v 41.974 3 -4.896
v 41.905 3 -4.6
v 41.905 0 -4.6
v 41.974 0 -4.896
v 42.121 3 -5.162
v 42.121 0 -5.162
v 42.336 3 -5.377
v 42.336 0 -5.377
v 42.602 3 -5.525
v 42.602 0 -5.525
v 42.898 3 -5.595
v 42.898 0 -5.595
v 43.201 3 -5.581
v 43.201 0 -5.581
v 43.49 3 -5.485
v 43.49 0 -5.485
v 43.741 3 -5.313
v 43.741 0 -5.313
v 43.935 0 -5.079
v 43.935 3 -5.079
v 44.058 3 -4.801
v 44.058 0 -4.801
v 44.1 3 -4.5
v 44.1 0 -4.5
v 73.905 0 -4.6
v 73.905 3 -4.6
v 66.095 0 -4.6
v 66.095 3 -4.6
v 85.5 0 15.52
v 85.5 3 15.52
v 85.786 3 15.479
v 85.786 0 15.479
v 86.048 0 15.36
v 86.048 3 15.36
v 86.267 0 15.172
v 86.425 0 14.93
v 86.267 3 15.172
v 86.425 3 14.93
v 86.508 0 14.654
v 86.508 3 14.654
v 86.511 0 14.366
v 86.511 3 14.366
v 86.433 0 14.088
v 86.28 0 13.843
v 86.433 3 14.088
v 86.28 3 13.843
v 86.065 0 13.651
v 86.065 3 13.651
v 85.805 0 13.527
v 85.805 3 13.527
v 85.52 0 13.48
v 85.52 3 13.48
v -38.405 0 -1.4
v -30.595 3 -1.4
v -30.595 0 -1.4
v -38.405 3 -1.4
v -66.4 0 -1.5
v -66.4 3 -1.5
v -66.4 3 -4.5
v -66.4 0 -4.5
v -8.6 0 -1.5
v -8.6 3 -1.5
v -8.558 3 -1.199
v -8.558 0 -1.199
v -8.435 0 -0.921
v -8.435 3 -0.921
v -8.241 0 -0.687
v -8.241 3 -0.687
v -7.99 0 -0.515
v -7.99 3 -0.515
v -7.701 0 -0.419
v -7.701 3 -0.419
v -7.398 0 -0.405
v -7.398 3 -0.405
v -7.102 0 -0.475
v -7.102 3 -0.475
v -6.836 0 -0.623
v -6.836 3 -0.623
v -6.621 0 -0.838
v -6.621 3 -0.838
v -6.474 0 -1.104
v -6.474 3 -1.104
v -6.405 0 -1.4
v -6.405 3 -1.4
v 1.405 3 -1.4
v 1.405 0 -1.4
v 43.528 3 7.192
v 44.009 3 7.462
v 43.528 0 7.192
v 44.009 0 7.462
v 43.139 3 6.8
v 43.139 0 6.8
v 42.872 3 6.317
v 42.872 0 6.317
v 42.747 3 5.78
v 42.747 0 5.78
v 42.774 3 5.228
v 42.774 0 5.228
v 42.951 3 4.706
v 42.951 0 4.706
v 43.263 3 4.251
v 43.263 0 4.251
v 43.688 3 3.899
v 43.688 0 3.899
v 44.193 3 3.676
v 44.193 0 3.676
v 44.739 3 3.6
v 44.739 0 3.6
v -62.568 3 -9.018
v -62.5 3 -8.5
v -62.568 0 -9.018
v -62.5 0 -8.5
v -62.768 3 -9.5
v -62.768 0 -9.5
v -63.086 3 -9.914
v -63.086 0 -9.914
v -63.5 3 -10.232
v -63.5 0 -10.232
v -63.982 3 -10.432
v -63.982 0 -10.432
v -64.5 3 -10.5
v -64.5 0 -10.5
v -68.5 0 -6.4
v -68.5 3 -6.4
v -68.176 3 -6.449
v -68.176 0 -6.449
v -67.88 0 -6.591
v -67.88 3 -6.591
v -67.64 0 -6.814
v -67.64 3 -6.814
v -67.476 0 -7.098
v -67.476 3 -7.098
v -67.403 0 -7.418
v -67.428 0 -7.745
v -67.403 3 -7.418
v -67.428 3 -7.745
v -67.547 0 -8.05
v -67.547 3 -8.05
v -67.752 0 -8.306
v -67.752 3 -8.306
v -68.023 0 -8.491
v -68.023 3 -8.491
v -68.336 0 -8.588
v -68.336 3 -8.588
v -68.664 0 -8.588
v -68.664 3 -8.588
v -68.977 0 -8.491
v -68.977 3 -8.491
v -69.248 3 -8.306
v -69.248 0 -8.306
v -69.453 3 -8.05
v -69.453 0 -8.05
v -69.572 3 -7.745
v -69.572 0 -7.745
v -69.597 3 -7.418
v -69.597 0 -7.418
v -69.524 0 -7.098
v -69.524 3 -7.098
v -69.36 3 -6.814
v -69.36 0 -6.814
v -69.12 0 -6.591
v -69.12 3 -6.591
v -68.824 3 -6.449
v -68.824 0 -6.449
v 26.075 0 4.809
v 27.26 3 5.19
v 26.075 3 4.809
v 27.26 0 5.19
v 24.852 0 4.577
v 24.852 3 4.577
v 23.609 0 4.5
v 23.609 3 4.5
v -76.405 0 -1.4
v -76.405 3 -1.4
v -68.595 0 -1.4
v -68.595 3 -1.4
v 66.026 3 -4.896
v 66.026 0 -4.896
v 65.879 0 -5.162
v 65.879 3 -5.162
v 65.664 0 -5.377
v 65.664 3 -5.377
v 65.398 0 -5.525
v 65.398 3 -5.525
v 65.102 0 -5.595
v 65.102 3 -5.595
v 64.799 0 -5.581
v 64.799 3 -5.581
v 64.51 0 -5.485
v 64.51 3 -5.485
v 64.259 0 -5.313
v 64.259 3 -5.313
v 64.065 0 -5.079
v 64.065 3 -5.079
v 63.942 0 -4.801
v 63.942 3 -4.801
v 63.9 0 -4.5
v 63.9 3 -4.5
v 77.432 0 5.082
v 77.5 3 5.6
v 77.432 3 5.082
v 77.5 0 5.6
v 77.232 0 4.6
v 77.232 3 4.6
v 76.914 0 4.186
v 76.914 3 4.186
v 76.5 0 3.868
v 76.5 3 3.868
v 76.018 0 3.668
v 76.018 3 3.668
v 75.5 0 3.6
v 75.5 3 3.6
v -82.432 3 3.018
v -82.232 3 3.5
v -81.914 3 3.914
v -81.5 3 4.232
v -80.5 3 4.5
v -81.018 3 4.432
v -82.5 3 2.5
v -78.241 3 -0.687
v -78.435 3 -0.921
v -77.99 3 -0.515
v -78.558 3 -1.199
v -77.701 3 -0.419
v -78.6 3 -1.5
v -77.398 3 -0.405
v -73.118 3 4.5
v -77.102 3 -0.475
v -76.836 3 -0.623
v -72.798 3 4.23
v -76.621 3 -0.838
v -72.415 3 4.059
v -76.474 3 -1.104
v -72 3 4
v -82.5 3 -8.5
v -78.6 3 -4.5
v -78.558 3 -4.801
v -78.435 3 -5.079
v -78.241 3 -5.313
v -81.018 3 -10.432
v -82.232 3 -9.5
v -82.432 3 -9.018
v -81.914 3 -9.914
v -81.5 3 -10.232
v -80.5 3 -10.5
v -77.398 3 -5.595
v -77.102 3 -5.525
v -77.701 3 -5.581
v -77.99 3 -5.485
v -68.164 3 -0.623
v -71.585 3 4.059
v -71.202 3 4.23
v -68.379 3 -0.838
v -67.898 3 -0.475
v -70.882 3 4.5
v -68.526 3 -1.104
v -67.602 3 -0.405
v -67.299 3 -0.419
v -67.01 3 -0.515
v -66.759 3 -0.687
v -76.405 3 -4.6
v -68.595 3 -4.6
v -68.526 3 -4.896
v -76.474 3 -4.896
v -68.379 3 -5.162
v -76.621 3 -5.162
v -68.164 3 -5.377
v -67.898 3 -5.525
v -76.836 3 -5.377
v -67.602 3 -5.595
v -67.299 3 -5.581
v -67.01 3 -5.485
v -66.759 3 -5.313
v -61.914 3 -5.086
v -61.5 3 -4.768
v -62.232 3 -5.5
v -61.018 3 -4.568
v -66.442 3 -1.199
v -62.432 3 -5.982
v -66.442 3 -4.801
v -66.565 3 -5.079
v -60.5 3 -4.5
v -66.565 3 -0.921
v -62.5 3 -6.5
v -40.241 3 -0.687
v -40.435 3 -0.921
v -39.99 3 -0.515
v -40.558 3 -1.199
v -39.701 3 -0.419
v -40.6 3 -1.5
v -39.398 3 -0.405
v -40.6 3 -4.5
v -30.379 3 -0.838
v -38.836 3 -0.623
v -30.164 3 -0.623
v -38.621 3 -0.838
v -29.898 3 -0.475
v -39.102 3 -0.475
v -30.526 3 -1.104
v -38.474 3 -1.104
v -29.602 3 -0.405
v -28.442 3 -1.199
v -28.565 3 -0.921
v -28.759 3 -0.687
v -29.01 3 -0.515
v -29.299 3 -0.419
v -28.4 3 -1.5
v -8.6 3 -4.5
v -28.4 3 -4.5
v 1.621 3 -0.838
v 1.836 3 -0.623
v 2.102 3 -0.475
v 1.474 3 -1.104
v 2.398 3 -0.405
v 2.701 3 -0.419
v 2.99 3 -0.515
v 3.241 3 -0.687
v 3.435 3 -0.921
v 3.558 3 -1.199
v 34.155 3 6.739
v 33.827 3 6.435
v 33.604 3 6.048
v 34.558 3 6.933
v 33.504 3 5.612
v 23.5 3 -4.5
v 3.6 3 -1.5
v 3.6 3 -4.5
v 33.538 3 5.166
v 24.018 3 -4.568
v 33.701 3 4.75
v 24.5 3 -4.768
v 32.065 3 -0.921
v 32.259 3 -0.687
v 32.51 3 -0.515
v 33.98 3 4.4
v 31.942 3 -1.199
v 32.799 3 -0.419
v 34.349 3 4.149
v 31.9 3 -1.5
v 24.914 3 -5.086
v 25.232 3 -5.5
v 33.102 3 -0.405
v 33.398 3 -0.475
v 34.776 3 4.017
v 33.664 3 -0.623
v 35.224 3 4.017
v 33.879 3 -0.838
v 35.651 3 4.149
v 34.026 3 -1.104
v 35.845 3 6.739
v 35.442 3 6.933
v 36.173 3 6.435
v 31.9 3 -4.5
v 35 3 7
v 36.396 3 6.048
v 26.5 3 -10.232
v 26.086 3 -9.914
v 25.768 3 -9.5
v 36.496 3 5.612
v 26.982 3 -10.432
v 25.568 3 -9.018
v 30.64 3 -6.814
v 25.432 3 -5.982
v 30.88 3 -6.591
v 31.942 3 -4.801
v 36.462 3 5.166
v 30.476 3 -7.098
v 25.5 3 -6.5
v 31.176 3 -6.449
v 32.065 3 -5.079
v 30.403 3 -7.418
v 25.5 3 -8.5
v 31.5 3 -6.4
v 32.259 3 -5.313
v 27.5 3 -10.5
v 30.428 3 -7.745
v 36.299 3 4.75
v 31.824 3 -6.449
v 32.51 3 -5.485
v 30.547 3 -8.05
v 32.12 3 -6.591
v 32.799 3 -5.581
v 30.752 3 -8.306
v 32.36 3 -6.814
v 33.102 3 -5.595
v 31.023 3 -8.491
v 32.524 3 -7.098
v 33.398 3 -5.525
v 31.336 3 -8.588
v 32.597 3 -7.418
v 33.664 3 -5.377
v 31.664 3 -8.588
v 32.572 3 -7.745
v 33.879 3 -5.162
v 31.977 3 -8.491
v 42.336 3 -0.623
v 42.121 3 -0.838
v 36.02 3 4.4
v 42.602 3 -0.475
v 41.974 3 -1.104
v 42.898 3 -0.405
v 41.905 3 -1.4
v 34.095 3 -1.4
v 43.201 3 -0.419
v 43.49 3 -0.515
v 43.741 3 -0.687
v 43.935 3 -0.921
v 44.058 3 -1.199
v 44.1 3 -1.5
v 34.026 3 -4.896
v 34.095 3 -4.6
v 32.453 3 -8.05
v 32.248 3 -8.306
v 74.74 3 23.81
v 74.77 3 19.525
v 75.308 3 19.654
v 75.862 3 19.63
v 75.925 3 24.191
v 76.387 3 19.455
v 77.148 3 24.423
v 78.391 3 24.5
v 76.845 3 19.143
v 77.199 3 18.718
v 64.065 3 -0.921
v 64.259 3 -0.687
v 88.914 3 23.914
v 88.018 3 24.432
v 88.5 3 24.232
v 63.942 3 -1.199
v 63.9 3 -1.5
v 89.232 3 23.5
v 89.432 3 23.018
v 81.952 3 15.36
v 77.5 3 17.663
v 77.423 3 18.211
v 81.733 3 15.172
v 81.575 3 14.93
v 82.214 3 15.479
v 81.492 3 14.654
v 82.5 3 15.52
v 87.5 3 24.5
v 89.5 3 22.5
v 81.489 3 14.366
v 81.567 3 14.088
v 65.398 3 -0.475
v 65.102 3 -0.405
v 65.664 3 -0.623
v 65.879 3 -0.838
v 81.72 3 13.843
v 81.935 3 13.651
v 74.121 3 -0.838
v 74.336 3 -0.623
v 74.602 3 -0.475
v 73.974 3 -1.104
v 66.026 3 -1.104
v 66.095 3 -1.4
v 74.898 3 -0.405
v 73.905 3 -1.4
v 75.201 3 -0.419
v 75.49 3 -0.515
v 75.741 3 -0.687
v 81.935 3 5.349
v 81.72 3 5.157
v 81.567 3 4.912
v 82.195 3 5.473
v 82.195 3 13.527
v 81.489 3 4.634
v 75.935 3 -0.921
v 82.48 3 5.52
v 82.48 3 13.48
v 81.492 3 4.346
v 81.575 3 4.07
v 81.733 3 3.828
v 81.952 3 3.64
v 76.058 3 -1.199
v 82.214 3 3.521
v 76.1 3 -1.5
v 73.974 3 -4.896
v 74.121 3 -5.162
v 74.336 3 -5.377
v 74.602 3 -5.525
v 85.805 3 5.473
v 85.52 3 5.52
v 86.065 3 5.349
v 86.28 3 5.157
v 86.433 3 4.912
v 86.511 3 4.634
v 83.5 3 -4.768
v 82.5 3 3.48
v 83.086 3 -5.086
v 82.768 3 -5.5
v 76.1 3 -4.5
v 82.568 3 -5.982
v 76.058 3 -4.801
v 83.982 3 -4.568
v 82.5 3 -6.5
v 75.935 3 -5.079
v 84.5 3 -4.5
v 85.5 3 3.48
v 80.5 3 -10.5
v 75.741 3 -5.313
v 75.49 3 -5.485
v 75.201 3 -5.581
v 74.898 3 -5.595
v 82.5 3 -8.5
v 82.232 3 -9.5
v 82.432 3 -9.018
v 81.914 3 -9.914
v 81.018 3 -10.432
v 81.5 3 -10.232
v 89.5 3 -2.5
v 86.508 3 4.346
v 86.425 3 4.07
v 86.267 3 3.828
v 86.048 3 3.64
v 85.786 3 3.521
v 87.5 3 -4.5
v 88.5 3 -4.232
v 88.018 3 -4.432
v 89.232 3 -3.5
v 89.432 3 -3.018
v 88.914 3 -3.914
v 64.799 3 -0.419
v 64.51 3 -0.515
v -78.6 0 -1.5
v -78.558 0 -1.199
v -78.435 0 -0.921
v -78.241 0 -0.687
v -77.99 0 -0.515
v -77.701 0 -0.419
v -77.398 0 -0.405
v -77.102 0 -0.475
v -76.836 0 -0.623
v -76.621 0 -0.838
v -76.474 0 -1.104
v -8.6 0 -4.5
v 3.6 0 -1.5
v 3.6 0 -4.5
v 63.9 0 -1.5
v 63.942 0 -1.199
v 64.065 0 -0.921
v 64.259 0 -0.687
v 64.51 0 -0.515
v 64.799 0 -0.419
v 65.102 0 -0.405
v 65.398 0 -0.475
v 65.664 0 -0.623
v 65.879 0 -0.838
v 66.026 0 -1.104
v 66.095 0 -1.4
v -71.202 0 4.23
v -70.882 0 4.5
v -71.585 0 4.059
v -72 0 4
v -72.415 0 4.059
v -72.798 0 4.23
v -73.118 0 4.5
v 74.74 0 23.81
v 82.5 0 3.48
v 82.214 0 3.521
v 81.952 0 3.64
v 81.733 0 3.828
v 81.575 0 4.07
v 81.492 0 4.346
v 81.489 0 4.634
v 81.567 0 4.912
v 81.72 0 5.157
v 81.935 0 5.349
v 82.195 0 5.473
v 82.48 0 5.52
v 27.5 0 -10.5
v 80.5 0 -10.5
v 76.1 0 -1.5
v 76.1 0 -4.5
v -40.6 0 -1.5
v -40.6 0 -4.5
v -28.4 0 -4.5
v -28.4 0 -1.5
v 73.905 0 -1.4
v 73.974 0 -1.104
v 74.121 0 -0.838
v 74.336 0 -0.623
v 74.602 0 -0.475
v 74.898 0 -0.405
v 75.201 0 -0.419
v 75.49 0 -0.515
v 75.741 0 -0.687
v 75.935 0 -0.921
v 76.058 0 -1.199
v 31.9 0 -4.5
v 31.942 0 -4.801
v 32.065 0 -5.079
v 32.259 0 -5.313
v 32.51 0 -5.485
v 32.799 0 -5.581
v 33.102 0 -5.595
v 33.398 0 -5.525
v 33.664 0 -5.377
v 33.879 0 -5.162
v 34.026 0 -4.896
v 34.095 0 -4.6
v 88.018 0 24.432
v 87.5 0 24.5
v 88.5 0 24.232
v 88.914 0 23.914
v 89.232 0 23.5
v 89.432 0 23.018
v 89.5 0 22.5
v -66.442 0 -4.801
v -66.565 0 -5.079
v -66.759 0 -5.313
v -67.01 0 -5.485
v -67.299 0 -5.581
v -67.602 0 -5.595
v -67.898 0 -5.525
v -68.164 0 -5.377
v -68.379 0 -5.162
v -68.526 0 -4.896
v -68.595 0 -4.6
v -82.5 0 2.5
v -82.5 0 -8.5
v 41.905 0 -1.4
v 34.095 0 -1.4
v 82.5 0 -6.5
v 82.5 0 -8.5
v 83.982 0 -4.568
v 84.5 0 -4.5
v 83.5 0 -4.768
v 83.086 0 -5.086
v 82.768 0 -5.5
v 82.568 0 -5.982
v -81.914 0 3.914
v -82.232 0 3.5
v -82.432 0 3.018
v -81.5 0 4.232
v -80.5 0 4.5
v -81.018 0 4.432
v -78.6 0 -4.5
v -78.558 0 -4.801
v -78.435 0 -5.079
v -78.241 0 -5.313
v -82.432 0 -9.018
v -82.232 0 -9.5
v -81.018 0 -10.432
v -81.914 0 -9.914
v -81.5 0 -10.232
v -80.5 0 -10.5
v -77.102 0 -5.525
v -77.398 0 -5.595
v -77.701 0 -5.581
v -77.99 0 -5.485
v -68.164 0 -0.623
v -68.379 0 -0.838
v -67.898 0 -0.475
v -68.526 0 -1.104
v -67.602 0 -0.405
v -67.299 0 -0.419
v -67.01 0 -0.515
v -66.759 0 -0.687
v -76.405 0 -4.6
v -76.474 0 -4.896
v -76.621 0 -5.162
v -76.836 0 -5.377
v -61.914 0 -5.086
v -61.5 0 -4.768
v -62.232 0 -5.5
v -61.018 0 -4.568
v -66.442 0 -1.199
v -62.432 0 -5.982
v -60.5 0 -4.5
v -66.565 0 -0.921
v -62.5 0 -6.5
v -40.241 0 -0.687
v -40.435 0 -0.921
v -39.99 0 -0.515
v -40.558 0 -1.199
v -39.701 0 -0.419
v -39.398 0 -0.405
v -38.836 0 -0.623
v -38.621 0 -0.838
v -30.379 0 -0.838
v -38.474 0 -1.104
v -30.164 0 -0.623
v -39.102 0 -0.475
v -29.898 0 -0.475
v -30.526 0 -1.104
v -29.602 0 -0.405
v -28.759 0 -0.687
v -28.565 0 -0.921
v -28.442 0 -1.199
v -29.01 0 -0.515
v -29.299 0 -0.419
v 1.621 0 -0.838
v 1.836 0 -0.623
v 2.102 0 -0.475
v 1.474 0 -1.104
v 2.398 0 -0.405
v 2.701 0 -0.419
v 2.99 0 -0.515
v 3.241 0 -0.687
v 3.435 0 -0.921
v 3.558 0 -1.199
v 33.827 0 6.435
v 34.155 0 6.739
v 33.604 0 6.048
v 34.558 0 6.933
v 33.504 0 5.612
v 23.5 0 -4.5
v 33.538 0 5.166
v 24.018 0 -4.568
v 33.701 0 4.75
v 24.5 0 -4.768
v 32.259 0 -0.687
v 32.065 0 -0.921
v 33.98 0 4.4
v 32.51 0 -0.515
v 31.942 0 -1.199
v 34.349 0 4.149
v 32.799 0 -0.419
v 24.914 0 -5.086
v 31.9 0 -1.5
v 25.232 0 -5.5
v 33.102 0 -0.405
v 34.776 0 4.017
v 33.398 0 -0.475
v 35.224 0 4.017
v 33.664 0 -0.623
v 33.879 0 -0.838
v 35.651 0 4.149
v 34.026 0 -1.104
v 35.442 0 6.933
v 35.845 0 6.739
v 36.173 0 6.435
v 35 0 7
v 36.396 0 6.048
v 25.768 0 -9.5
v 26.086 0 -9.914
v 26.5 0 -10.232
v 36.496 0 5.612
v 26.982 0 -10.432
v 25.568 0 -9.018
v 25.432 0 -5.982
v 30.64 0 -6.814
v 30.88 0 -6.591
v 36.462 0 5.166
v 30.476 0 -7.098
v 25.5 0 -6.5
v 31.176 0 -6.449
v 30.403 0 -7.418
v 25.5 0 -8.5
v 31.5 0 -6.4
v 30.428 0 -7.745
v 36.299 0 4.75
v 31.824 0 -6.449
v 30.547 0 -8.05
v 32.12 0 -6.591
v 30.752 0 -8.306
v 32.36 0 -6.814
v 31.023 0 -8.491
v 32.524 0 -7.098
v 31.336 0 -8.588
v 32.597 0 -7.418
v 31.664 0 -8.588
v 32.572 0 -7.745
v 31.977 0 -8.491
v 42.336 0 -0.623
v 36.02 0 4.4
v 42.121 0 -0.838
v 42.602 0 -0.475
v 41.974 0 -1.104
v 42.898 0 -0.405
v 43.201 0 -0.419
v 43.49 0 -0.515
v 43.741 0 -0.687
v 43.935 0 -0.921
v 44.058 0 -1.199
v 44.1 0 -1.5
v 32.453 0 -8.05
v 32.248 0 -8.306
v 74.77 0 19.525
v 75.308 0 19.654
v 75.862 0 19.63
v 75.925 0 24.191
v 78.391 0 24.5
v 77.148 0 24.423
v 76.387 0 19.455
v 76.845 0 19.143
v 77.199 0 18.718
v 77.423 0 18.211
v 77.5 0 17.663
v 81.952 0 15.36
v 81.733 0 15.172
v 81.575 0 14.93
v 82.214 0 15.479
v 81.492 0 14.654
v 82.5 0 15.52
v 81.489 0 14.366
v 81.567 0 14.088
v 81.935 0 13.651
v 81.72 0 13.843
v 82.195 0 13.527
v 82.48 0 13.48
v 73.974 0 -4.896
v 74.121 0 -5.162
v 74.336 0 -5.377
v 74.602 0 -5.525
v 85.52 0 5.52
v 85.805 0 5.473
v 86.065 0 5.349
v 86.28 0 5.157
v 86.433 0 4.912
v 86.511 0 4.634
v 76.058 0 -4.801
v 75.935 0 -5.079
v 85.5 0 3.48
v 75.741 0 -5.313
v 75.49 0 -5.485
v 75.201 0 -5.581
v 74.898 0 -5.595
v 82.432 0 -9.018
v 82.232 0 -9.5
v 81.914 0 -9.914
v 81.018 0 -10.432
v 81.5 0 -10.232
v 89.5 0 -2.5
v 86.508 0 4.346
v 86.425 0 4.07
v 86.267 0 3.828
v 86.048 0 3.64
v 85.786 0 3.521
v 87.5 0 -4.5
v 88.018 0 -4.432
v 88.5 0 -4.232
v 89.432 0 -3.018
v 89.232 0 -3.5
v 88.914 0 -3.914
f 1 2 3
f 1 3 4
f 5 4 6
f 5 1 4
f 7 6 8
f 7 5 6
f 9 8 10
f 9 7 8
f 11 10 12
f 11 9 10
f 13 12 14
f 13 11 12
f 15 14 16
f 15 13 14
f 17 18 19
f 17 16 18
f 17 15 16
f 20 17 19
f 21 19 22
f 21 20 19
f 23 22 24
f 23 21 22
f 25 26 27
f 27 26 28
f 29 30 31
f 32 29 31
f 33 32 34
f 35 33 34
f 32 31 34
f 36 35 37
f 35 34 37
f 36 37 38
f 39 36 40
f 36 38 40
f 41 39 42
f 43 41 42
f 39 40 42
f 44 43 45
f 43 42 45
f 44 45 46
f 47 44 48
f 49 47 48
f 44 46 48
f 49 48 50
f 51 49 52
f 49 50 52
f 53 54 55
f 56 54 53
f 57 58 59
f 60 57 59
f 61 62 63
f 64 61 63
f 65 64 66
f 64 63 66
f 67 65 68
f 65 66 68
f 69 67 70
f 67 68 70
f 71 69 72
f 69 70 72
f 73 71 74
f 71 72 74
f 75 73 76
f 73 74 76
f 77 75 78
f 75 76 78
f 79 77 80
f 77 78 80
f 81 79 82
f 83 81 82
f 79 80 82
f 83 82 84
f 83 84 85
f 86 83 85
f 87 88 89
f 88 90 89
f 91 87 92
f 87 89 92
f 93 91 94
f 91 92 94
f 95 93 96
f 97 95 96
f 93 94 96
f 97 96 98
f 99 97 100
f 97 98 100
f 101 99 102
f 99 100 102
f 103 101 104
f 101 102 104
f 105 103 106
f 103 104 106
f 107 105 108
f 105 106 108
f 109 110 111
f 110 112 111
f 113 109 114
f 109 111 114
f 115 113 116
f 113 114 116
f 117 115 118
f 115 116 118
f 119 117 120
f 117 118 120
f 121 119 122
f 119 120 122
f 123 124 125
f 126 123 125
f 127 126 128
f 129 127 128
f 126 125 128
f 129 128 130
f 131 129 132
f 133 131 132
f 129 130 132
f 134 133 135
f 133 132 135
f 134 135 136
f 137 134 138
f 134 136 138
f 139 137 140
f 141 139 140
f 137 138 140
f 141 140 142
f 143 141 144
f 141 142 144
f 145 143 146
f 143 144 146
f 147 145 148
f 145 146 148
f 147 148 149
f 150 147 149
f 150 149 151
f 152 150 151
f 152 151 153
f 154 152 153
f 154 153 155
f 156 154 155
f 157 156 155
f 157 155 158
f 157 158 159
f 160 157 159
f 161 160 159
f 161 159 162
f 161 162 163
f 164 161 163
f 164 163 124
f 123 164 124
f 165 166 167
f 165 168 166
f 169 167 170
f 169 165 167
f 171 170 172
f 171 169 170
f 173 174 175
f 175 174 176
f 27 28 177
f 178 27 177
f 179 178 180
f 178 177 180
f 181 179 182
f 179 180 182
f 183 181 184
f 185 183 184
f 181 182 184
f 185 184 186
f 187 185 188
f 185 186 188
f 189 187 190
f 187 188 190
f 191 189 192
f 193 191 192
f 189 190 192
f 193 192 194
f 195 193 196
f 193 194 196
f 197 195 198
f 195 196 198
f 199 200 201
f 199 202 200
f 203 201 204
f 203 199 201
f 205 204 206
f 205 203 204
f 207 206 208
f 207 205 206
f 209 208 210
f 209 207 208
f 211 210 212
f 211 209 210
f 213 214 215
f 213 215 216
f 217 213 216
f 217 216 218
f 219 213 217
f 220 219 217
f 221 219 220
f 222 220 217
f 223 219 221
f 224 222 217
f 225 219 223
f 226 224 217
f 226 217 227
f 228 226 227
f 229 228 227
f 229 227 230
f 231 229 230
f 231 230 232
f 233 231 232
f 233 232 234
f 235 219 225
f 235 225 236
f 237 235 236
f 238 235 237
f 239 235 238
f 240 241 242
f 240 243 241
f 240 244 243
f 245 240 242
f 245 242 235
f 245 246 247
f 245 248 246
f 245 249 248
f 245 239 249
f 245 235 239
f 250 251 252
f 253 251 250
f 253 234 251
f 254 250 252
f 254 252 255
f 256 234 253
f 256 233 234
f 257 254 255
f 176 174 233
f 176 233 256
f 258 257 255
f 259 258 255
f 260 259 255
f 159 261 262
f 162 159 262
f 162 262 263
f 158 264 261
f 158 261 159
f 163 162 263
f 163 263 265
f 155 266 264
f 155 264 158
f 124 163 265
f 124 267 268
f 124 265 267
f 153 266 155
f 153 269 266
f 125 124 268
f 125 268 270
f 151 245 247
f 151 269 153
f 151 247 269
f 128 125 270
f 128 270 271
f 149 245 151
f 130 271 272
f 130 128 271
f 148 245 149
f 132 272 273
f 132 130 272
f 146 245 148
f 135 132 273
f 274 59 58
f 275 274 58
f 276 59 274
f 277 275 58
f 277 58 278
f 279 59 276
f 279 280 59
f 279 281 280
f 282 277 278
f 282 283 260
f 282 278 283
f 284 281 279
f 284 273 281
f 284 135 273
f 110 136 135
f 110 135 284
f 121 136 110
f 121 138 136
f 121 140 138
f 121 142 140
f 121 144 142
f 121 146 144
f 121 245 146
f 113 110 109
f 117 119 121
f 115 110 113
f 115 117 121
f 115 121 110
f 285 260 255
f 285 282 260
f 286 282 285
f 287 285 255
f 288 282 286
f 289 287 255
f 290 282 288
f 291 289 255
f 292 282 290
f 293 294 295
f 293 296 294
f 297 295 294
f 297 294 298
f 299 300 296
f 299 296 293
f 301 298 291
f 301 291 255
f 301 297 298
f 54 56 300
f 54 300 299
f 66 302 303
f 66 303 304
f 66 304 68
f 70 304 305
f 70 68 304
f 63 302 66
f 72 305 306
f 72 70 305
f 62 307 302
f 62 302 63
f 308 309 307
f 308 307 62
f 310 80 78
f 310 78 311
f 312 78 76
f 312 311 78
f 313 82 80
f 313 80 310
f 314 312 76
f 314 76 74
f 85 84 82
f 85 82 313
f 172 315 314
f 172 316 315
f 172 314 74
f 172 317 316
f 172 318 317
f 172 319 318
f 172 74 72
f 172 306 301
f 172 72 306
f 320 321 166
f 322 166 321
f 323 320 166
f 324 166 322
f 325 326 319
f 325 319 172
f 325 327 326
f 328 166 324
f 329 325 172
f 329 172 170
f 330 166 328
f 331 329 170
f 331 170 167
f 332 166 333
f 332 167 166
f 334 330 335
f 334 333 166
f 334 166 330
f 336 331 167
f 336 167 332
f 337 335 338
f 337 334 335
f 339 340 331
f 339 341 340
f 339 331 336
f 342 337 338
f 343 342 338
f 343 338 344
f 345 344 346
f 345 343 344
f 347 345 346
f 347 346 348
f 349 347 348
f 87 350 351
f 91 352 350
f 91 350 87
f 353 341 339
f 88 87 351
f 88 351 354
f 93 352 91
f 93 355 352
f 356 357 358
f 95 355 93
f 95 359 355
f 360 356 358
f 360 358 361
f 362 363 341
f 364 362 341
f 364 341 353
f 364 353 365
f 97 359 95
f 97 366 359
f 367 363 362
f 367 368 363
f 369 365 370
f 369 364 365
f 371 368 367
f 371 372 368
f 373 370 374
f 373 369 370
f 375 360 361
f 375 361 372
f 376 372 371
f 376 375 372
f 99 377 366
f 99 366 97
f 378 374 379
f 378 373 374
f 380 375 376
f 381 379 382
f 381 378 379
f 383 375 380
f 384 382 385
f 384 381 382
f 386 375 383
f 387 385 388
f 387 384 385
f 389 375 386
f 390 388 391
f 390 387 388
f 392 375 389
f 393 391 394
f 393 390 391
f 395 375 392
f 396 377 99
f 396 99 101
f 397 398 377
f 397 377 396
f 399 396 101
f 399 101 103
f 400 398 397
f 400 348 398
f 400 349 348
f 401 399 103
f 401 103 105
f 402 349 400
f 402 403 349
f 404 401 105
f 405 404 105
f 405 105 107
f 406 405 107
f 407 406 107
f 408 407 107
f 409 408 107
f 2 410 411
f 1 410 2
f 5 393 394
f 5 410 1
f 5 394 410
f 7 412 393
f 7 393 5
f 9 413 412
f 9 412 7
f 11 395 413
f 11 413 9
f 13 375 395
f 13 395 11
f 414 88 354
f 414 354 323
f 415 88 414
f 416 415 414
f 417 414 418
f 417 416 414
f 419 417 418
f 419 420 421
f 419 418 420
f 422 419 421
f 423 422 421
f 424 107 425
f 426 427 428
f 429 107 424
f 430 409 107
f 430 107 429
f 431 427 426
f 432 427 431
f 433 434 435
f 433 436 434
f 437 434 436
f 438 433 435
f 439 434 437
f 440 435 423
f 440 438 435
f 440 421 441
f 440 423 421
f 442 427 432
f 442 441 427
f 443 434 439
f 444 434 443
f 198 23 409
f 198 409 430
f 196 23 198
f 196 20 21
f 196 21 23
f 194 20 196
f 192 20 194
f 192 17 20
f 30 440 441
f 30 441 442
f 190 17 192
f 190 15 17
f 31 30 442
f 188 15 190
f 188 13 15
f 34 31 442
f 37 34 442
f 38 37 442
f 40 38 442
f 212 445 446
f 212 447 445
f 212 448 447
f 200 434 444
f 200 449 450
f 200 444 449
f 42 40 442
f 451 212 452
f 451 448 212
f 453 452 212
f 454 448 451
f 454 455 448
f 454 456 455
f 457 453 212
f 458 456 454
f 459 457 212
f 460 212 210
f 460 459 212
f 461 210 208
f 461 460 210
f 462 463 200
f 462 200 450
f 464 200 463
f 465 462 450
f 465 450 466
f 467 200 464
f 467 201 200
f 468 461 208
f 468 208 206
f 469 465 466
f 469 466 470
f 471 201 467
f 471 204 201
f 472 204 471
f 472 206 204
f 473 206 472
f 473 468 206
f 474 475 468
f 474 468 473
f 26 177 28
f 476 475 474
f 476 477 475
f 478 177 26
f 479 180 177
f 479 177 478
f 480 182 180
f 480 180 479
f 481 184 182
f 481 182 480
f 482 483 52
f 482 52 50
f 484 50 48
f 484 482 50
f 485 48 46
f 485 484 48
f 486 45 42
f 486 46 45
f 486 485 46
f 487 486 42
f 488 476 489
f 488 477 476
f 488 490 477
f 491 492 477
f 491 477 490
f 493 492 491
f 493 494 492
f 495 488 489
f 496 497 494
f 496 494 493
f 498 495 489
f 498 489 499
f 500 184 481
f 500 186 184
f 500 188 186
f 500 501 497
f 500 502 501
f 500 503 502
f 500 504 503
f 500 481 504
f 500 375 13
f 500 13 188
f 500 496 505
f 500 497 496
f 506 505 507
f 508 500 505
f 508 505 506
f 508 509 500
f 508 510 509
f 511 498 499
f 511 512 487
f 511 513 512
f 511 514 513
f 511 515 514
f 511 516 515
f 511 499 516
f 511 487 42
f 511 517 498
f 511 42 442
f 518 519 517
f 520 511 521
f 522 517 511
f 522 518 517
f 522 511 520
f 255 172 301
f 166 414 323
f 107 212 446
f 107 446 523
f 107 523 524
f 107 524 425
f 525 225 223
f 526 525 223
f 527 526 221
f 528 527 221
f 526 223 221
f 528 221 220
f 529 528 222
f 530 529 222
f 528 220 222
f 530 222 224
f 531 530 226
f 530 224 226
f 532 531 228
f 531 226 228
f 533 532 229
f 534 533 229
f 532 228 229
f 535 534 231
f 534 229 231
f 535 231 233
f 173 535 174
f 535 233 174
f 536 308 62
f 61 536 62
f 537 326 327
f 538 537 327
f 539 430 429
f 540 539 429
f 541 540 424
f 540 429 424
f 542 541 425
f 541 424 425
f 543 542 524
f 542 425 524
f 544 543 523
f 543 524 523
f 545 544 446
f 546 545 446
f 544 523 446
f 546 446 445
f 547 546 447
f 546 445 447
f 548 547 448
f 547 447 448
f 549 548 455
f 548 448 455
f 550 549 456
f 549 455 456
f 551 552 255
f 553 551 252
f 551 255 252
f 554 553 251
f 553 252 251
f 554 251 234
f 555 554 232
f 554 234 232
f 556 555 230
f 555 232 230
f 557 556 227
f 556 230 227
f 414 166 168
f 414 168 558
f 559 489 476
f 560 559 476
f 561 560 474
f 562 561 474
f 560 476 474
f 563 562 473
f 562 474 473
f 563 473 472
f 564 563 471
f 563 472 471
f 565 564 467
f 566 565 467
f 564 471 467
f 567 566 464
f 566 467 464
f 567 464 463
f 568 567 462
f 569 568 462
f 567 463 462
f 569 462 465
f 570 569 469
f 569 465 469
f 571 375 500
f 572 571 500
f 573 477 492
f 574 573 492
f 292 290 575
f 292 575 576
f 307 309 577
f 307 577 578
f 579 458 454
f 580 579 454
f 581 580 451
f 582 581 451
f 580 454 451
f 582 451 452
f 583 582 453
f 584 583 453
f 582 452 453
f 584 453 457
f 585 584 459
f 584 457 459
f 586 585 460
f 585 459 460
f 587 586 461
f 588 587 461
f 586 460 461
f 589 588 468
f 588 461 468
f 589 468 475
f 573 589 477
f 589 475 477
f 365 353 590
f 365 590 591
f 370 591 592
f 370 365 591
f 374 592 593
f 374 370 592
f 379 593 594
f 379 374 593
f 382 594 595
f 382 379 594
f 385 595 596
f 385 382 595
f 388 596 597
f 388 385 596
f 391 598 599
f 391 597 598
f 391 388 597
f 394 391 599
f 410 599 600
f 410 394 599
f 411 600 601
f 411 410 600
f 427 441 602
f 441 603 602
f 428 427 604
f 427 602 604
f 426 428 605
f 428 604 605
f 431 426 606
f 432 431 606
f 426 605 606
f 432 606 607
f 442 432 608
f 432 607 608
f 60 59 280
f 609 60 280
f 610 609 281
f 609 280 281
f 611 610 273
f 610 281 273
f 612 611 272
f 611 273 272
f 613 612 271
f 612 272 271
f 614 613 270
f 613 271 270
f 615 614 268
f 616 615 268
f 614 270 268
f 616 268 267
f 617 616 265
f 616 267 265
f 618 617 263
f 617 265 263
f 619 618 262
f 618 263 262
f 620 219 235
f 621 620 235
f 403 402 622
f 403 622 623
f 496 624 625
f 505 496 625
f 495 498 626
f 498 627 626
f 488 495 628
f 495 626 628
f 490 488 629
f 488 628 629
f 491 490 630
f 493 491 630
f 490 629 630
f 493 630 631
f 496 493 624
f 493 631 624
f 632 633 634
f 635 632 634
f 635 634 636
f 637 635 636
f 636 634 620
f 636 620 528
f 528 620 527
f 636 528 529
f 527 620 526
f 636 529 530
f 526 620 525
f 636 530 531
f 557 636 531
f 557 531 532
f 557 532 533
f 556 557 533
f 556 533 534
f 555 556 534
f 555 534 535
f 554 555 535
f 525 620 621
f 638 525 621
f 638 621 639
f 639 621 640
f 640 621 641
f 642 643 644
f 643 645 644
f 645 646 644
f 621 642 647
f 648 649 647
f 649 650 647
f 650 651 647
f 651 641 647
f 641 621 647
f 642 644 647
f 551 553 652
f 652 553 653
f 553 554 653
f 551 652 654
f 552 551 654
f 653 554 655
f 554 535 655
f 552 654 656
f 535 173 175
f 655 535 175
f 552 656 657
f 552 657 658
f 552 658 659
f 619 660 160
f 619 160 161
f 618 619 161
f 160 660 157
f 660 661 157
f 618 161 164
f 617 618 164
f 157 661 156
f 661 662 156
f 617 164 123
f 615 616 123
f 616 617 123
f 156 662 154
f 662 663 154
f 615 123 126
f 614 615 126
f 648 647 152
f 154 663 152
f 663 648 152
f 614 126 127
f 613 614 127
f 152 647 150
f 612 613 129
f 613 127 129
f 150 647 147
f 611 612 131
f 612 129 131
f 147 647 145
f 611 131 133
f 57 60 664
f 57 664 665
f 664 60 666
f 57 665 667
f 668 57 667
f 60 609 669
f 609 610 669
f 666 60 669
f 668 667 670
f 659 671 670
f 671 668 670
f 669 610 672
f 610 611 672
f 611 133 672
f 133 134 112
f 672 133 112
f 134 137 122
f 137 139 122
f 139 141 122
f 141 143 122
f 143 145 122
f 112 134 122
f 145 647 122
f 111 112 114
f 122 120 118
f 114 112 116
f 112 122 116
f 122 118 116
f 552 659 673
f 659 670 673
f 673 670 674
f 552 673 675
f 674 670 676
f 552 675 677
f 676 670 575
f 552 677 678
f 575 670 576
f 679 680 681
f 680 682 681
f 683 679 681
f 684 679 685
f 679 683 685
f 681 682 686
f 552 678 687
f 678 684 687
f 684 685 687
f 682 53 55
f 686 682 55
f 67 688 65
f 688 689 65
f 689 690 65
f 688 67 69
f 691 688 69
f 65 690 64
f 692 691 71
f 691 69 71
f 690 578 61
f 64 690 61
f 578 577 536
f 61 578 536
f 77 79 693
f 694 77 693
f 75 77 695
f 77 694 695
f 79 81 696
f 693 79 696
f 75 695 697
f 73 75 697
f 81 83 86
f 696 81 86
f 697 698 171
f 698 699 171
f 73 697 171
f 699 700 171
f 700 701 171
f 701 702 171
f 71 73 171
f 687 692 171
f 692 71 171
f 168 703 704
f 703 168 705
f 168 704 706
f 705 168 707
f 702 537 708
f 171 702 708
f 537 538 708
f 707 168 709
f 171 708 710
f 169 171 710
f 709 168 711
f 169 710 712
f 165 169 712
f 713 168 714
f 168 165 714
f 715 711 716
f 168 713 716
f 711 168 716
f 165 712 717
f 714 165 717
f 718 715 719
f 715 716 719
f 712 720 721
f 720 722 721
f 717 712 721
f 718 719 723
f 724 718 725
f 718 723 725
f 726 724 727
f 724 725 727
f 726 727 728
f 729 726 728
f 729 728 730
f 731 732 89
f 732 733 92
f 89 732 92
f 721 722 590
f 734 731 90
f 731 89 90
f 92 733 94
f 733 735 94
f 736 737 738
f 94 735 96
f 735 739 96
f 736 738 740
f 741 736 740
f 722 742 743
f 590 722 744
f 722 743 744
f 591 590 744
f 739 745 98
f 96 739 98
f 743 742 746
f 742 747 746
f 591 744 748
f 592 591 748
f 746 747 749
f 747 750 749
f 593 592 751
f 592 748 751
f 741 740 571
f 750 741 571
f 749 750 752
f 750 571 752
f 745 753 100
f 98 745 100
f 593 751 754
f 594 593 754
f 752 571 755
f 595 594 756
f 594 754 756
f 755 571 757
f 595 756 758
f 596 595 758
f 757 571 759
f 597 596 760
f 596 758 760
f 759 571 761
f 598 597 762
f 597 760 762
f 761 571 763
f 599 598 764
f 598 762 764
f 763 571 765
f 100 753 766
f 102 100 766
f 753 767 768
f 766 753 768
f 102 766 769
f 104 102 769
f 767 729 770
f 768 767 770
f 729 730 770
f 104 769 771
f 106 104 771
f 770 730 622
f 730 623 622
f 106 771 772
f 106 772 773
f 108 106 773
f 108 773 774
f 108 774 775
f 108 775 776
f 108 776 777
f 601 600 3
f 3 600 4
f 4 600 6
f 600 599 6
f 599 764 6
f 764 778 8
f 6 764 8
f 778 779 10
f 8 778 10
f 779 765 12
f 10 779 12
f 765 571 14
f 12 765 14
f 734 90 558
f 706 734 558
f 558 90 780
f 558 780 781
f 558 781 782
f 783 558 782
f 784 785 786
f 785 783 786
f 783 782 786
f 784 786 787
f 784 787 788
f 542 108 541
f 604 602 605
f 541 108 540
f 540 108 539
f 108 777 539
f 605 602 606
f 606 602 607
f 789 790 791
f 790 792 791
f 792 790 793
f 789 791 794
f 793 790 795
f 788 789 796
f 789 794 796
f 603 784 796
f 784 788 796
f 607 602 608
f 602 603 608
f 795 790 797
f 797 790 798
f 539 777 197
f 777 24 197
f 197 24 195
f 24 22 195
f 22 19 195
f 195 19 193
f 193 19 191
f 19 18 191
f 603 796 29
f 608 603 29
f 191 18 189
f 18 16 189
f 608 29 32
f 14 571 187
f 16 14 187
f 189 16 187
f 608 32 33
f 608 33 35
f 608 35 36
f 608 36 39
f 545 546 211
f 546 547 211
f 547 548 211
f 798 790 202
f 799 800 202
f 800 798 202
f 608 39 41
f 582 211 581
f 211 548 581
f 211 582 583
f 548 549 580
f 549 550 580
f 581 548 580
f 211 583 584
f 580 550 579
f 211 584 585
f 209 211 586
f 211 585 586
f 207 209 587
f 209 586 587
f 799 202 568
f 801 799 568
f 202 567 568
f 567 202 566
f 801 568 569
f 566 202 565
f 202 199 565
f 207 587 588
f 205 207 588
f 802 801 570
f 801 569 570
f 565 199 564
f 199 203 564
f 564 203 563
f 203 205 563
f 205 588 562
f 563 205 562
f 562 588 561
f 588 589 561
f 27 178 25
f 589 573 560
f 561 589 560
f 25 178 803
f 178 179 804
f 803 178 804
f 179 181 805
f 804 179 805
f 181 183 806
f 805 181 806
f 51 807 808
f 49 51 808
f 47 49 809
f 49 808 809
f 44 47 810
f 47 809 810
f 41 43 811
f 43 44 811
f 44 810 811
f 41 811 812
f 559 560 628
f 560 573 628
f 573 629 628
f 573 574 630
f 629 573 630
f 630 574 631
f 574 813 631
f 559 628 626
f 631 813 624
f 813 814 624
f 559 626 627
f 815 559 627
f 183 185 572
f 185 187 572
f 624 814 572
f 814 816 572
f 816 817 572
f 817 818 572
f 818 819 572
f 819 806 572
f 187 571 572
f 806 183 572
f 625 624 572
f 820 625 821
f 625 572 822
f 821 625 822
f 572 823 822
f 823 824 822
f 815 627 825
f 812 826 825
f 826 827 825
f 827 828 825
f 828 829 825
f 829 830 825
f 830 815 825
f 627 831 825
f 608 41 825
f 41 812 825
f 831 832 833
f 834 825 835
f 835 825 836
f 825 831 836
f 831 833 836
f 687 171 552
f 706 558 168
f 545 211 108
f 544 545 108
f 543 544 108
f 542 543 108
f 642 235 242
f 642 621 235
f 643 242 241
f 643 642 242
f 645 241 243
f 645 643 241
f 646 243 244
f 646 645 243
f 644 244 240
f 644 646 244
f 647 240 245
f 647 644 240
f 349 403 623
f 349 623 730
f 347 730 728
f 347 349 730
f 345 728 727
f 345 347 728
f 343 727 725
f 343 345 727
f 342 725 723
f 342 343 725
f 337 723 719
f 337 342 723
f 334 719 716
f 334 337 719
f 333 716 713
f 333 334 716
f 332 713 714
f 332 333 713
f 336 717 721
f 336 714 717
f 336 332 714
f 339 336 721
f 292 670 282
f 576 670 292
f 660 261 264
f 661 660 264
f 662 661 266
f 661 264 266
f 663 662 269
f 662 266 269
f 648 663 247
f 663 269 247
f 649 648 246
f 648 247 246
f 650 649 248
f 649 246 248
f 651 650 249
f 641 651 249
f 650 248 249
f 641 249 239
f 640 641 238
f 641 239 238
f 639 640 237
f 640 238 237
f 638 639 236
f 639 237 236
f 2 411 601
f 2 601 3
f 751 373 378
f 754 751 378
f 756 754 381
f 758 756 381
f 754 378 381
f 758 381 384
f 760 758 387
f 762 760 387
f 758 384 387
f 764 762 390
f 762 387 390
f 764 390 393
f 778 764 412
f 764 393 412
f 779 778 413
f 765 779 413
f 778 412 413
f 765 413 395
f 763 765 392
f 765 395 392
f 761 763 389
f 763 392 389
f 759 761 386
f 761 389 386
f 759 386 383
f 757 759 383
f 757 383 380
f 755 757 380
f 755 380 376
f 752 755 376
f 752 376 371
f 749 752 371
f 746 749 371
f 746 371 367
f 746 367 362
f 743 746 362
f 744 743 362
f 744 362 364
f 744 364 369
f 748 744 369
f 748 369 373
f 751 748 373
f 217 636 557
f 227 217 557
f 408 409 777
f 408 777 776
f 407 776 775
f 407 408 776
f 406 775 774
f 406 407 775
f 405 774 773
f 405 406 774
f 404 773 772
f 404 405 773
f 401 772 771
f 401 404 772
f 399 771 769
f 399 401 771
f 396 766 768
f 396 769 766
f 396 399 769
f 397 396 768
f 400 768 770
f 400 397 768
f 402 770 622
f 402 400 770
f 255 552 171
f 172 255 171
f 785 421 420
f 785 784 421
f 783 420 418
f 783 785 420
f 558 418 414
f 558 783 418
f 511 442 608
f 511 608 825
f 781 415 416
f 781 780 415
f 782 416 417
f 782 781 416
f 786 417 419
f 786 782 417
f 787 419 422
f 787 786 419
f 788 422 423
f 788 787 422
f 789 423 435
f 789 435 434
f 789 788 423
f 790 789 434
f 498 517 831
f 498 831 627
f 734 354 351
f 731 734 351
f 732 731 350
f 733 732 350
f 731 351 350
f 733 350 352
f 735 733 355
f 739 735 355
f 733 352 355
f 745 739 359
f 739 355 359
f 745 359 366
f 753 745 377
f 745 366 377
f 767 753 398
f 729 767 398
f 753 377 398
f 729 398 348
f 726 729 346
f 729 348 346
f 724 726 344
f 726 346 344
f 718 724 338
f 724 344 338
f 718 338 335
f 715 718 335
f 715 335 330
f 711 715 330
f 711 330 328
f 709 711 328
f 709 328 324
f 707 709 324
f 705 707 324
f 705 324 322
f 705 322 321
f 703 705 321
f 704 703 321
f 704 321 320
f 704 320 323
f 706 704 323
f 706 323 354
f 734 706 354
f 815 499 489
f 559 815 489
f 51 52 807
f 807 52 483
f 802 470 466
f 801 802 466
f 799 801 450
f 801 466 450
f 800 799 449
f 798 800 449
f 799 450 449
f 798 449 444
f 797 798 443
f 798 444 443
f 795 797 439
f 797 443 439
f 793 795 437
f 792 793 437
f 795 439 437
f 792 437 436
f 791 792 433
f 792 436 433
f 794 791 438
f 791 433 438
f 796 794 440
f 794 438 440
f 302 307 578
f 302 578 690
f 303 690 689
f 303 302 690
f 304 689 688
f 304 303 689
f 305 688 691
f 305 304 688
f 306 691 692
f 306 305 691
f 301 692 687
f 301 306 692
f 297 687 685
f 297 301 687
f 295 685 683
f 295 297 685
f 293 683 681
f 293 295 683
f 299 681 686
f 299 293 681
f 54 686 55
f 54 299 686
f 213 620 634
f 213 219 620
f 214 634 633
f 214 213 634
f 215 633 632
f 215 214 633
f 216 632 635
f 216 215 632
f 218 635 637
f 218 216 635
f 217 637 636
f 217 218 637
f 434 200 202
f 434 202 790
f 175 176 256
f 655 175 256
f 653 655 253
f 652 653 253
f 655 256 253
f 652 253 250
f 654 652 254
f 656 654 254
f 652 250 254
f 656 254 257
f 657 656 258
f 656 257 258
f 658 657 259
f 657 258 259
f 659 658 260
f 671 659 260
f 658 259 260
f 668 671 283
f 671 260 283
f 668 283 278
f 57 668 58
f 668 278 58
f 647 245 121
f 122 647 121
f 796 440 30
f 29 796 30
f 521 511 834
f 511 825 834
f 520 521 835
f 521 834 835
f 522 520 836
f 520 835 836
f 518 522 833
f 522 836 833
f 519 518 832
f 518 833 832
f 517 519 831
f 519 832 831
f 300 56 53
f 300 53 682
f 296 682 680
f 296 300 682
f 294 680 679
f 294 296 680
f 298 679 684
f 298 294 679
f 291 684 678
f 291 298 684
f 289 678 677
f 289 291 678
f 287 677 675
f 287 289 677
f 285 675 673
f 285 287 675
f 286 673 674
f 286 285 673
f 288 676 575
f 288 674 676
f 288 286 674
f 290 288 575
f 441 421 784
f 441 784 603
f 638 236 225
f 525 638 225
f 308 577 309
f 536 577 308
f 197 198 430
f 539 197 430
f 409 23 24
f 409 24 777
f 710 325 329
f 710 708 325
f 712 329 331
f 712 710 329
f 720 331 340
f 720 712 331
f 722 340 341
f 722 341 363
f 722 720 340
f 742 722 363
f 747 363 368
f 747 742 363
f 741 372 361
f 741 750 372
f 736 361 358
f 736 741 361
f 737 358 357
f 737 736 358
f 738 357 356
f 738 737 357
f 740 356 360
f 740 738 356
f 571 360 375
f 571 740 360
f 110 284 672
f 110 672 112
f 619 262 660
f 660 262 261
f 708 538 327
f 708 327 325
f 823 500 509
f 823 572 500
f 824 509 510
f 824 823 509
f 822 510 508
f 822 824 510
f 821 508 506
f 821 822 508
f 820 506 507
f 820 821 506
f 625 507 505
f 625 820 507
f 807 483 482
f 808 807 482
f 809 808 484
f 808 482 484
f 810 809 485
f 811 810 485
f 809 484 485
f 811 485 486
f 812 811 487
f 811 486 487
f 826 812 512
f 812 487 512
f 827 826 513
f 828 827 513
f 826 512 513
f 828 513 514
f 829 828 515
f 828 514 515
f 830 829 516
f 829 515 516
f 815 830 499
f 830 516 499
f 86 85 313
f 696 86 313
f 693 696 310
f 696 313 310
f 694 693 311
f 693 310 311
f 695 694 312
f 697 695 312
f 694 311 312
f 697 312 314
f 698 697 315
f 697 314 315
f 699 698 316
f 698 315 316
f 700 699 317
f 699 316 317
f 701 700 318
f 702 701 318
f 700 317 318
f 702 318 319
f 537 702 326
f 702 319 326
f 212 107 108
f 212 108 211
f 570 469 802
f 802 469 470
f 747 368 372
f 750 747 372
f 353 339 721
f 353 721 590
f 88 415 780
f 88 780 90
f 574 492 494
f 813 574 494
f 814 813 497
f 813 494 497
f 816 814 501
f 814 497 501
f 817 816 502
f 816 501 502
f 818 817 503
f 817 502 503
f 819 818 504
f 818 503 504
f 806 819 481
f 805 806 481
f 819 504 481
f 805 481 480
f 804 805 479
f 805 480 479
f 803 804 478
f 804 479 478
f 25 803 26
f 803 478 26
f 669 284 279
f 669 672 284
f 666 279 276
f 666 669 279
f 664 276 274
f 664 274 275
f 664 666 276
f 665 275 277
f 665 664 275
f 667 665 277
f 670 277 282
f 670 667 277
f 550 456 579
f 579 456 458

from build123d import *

# Parameters (mm, degrees)
SKETCH_1_W             = 165
SKETCH_1_H             = 9
EXTRUDE_1_DEPTH        = 3
SKETCH_2_W             = 20
SKETCH_2_H             = 6
SKETCH_2_W_2           = 57
EXTRUDE_2_DEPTH        = 3
FILLET_1_R             = 2
SKETCH_3_W             = 12
SKETCH_3_H             = 3
CUT_EXTRUDE_1_DEPTH    = 87.113297463
SKETCH_5_R             = 1
CUT_EXTRUDE_3_DEPTH    = 87.113297463
EXTRUDE_4_DEPTH        = 3
SKETCH_10_R            = 1
CUT_EXTRUDE_5_DEPTH    = 93.841262378
CUT_EXTRUDE_6415_DEPTH = 93.841262378
FILLET_2_R             = 2
FILLET_3_R             = 10
CUT_EXTRUDE_6_DEPTH    = 93.841262378
FILLET_4_R             = 2
SKETCH_12_R            = 1.1
SKETCH_12_R_2          = 1.5
CUT_EXTRUDE_7_DEPTH    = 93.841262378


with BuildPart() as part:
    # 草图1 → 凸台-拉伸1 (new body)
    with BuildSketch(Plane(origin=(0, 0, 0), x_dir=(1, 0, 0), z_dir=(0, 1, 0))):
        Rectangle(SKETCH_1_W, SKETCH_1_H)
    extrude(amount=EXTRUDE_1_DEPTH)

    # 草图2 → 凸台-拉伸2 (add)
    with BuildSketch(Plane(origin=(0, 3, 0), x_dir=(1, 0, 0), z_dir=(0, 1, 0))):
        with Locations((-72.5, 7.5)):
            Rectangle(SKETCH_2_W, SKETCH_2_H)
        Polygon((82.5, -24.5), (82.5, -4.5), (25.5, -4.5), (76.5, -24.5), align=None)
        with Locations((54, 7.5)):
            Rectangle(SKETCH_2_W_2, SKETCH_2_H)
    extrude(amount=-EXTRUDE_2_DEPTH)

    # 圆角1
    fillet_1_edges = [part.edges().sort_by_distance(p)[0] for p in [
        (-82.5, 1.5, -10.5),
        (-62.5, 1.5, -10.5),
        (-62.5, 1.5, -4.5),
        (82.5, 1.5, -10.5),
        (25.5, 1.5, -4.5),
        (25.5, 1.5, -10.5),
        (-82.5, 1.5, 4.5),
    ]]
    fillet(fillet_1_edges, radius=FILLET_1_R)

    # 草图3 → 切除-拉伸1 (cut, through all)
    with BuildSketch(Plane(origin=(0, 3, 0), x_dir=(1, 0, 0), z_dir=(0, 1, 0))):
        with Locations((-72.5, 3)):
            Rectangle(SKETCH_3_W, SKETCH_3_H)
        with Locations((-34.5, 3)):
            Rectangle(SKETCH_3_W, SKETCH_3_H)
        with Locations((-2.5, 3)):
            Rectangle(SKETCH_3_W, SKETCH_3_H)
        with Locations((38, 3)):
            Rectangle(SKETCH_3_W, SKETCH_3_H)
        with Locations((70, 3)):
            Rectangle(SKETCH_3_W, SKETCH_3_H)
    extrude(amount=-CUT_EXTRUDE_1_DEPTH, mode=Mode.SUBTRACT)

    # 草图5 → 切除-拉伸3 (cut, through all)
    with BuildSketch(Plane(origin=(0, 3, 0), x_dir=(1, 0, 0), z_dir=(0, 1, 0))):
        with Locations((-67.5, 4.5)):
            Circle(SKETCH_5_R)
        with Locations((-67.5, 1.5)):
            Circle(SKETCH_5_R)
        with Locations((-77.5, 1.5)):
            Circle(SKETCH_5_R)
        with Locations((-77.5, 4.5)):
            Circle(SKETCH_5_R)
        with Locations((-29.5, 1.5)):
            Circle(SKETCH_5_R)
        with Locations((-39.5, 1.5)):
            Circle(SKETCH_5_R)
        with Locations((2.5, 1.5)):
            Circle(SKETCH_5_R)
        with Locations((-7.5, 1.5)):
            Circle(SKETCH_5_R)
        with Locations((33, 1.5)):
            Circle(SKETCH_5_R)
        with Locations((43, 1.5)):
            Circle(SKETCH_5_R)
        with Locations((43, 4.5)):
            Circle(SKETCH_5_R)
        with Locations((33, 4.5)):
            Circle(SKETCH_5_R)
        with Locations((75, 4.5)):
            Circle(SKETCH_5_R)
        with Locations((65, 4.5)):
            Circle(SKETCH_5_R)
        with Locations((65, 1.5)):
            Circle(SKETCH_5_R)
        with Locations((75, 1.5)):
            Circle(SKETCH_5_R)
    extrude(amount=-CUT_EXTRUDE_3_DEPTH, mode=Mode.SUBTRACT)

    # 草图9 → 凸台-拉伸4 (add)
    with BuildSketch(Plane(origin=(0, 3, 0), x_dir=(1, 0, 0), z_dir=(0, 1, 0))):
        Polygon((82.5, -15.5), (82.5, -24.5), (89.5, -24.5), (89.5, 4.5), (82.5, 4.5), (82.5, -3.5), (85.5, -3.5), (85.5, -15.5), align=None)
    extrude(amount=-EXTRUDE_4_DEPTH)

    # 草图10 → 切除-拉伸5 (cut, through all)
    with BuildSketch(Plane(origin=(0, 3, 0), x_dir=(1, 0, 0), z_dir=(0, 1, 0))):
        with Locations((85.5, -4.5)):
            Circle(SKETCH_10_R)
        with Locations((85.5, -14.5)):
            Circle(SKETCH_10_R)
        with Locations((82.5, -14.5)):
            Circle(SKETCH_10_R)
        with Locations((82.5, -4.5)):
            Circle(SKETCH_10_R)
    extrude(amount=-CUT_EXTRUDE_5_DEPTH, mode=Mode.SUBTRACT)

    # 草图6 → Cut-Extrude 6415 (cut, through all)
    with BuildSketch(Plane(origin=(0, 3, 0), x_dir=(1, 0, 0), z_dir=(0, 1, 0))):
        with BuildLine():
            Line((-78.6, 4.5), (-78.6, 1.5))
            ThreePointArc((-78.6, 1.5), (-77.550051841, 0.401139311), (-76.404554885, 1.4))
            Line((-76.404554885, 1.4), (-68.595445115, 1.4))
            ThreePointArc((-68.595445115, 1.4), (-67.449948159, 0.401139311), (-66.4, 1.5))
            Line((-66.4, 1.5), (-66.4, 4.5))
            ThreePointArc((-66.4, 4.5), (-67.449948159, 5.598860689), (-68.595445115, 4.6))
            Line((-68.595445115, 4.6), (-76.404554885, 4.6))
            ThreePointArc((-76.404554885, 4.6), (-77.550051841, 5.598860689), (-78.6, 4.5))
        make_face()
        with BuildLine():
            Line((34.095445115, 4.6), (41.904554885, 4.6))
            ThreePointArc((41.904554885, 4.6), (43.050051841, 5.598860689), (44.1, 4.5))
            Line((44.1, 4.5), (44.1, 1.5))
            ThreePointArc((44.1, 1.5), (43.050051841, 0.401139311), (41.904554885, 1.4))
            Line((41.904554885, 1.4), (34.095445115, 1.4))
            ThreePointArc((34.095445115, 1.4), (32.949948159, 0.401139311), (31.9, 1.5))
            Line((31.9, 1.5), (31.9, 4.5))
            ThreePointArc((31.9, 4.5), (32.949948159, 5.598860689), (34.095445115, 4.6))
        make_face()
        with BuildLine():
            Line((63.9, 4.5), (63.9, 1.5))
            ThreePointArc((63.9, 1.5), (64.949948159, 0.401139311), (66.095445115, 1.4))
            Line((66.095445115, 1.4), (73.904554885, 1.4))
            ThreePointArc((73.904554885, 1.4), (75.050051841, 0.401139311), (76.1, 1.5))
            Line((76.1, 1.5), (76.1, 4.5))
            ThreePointArc((76.1, 4.5), (75.050051841, 5.598860689), (73.904554885, 4.6))
            Line((73.904554885, 4.6), (66.095445115, 4.6))
            ThreePointArc((66.095445115, 4.6), (64.949948159, 5.598860689), (63.9, 4.5))
        make_face()
        with BuildLine():
            Line((-38.404554885, 4.6), (-30.595445115, 4.6))
            ThreePointArc((-30.595445115, 4.6), (-29.449948159, 5.598860689), (-28.4, 4.5))
            Line((-28.4, 4.5), (-28.4, 1.5))
            ThreePointArc((-28.4, 1.5), (-29.449948159, 0.401139311), (-30.595445115, 1.4))
            Line((-30.595445115, 1.4), (-38.404554885, 1.4))
            ThreePointArc((-38.404554885, 1.4), (-39.550051841, 0.401139311), (-40.6, 1.5))
            Line((-40.6, 1.5), (-40.6, 4.5))
            ThreePointArc((-40.6, 4.5), (-39.550051841, 5.598860689), (-38.404554885, 4.6))
        make_face()
        with BuildLine():
            Line((-8.6, 4.5), (-8.6, 1.5))
            ThreePointArc((-8.6, 1.5), (-7.550051841, 0.401139311), (-6.404554885, 1.4))
            Line((-6.404554885, 1.4), (1.404554885, 1.4))
            ThreePointArc((1.404554885, 1.4), (2.550051841, 0.401139311), (3.6, 1.5))
            Line((3.6, 1.5), (3.6, 4.5))
            ThreePointArc((3.6, 4.5), (2.550051841, 5.598860689), (1.404554885, 4.6))
            Line((1.404554885, 4.6), (-6.404554885, 4.6))
            ThreePointArc((-6.404554885, 4.6), (-7.550051841, 5.598860689), (-8.6, 4.5))
        make_face()
        with BuildLine():
            Line((82.48, -5.519803903), (82.48, -13.480196097))
            ThreePointArc((82.48, -13.480196097), (81.480049025, -14.510000481), (82.5, -15.52))
            Line((82.5, -15.52), (85.5, -15.52))
            ThreePointArc((85.5, -15.52), (86.519950975, -14.510000481), (85.52, -13.480196097))
            Line((85.52, -13.480196097), (85.52, -5.519803903))
            ThreePointArc((85.52, -5.519803903), (86.519950975, -4.489999519), (85.5, -3.48))
            Line((85.5, -3.48), (82.5, -3.48))
            ThreePointArc((82.5, -3.48), (81.480049025, -4.489999519), (82.48, -5.519803903))
        make_face()
    extrude(amount=-CUT_EXTRUDE_6415_DEPTH, mode=Mode.SUBTRACT)

    # 圆角2
    fillet_2_edges = [part.edges().sort_by_distance(p)[0] for p in [
        (89.5, 1.5, 24.5),
        (89.5, 1.5, -4.5),
        (82.5, 1.5, -4.5),
    ]]
    fillet(fillet_2_edges, radius=FILLET_2_R)

    # 圆角3
    fillet_3_edges = [part.edges().sort_by_distance(p)[0] for p in [
        (76.5, 1.5, 24.5),
        (25.5, 1.5, 4.5),
    ]]
    fillet(fillet_3_edges, radius=FILLET_3_R)

    # 草图11 → 切除-拉伸6 (cut, through all)
    with BuildSketch(Plane(origin=(0, 3, 0), x_dir=(1, 0, 0), z_dir=(0, 1, 0))):
        Polygon((34.16127674, -3.6), (77.5, -3.6), (77.5, -20.595577749), align=None)
    extrude(amount=-CUT_EXTRUDE_6_DEPTH, mode=Mode.SUBTRACT)

    # 圆角4
    fillet_4_edges = [part.edges().sort_by_distance(p)[0] for p in [
        (77.5, 1.5, 20.595577749),
        (34.16127674, 1.5, 3.6),
        (77.5, 1.5, 3.6),
    ]]
    fillet(fillet_4_edges, radius=FILLET_4_R)

    # 草图12 → 切除-拉伸7 (cut, through all)
    with BuildSketch(Plane(origin=(0, 3, 0), x_dir=(1, 0, 0), z_dir=(0, 1, 0))):
        with Locations(Location((-68.5, 7.5, 0), (0, 0, 270))):
            Circle(SKETCH_12_R)
        with Locations(Location((31.5, 7.5, 0), (0, 0, 270))):
            Circle(SKETCH_12_R)
        with Locations(Location((35, -5.5, 0), (0, 0, 270))):
            Circle(SKETCH_12_R_2)
        with Locations((-72, -5.5)):
            Circle(SKETCH_12_R_2)
    extrude(amount=-CUT_EXTRUDE_7_DEPTH, mode=Mode.SUBTRACT)


solid = part.part
